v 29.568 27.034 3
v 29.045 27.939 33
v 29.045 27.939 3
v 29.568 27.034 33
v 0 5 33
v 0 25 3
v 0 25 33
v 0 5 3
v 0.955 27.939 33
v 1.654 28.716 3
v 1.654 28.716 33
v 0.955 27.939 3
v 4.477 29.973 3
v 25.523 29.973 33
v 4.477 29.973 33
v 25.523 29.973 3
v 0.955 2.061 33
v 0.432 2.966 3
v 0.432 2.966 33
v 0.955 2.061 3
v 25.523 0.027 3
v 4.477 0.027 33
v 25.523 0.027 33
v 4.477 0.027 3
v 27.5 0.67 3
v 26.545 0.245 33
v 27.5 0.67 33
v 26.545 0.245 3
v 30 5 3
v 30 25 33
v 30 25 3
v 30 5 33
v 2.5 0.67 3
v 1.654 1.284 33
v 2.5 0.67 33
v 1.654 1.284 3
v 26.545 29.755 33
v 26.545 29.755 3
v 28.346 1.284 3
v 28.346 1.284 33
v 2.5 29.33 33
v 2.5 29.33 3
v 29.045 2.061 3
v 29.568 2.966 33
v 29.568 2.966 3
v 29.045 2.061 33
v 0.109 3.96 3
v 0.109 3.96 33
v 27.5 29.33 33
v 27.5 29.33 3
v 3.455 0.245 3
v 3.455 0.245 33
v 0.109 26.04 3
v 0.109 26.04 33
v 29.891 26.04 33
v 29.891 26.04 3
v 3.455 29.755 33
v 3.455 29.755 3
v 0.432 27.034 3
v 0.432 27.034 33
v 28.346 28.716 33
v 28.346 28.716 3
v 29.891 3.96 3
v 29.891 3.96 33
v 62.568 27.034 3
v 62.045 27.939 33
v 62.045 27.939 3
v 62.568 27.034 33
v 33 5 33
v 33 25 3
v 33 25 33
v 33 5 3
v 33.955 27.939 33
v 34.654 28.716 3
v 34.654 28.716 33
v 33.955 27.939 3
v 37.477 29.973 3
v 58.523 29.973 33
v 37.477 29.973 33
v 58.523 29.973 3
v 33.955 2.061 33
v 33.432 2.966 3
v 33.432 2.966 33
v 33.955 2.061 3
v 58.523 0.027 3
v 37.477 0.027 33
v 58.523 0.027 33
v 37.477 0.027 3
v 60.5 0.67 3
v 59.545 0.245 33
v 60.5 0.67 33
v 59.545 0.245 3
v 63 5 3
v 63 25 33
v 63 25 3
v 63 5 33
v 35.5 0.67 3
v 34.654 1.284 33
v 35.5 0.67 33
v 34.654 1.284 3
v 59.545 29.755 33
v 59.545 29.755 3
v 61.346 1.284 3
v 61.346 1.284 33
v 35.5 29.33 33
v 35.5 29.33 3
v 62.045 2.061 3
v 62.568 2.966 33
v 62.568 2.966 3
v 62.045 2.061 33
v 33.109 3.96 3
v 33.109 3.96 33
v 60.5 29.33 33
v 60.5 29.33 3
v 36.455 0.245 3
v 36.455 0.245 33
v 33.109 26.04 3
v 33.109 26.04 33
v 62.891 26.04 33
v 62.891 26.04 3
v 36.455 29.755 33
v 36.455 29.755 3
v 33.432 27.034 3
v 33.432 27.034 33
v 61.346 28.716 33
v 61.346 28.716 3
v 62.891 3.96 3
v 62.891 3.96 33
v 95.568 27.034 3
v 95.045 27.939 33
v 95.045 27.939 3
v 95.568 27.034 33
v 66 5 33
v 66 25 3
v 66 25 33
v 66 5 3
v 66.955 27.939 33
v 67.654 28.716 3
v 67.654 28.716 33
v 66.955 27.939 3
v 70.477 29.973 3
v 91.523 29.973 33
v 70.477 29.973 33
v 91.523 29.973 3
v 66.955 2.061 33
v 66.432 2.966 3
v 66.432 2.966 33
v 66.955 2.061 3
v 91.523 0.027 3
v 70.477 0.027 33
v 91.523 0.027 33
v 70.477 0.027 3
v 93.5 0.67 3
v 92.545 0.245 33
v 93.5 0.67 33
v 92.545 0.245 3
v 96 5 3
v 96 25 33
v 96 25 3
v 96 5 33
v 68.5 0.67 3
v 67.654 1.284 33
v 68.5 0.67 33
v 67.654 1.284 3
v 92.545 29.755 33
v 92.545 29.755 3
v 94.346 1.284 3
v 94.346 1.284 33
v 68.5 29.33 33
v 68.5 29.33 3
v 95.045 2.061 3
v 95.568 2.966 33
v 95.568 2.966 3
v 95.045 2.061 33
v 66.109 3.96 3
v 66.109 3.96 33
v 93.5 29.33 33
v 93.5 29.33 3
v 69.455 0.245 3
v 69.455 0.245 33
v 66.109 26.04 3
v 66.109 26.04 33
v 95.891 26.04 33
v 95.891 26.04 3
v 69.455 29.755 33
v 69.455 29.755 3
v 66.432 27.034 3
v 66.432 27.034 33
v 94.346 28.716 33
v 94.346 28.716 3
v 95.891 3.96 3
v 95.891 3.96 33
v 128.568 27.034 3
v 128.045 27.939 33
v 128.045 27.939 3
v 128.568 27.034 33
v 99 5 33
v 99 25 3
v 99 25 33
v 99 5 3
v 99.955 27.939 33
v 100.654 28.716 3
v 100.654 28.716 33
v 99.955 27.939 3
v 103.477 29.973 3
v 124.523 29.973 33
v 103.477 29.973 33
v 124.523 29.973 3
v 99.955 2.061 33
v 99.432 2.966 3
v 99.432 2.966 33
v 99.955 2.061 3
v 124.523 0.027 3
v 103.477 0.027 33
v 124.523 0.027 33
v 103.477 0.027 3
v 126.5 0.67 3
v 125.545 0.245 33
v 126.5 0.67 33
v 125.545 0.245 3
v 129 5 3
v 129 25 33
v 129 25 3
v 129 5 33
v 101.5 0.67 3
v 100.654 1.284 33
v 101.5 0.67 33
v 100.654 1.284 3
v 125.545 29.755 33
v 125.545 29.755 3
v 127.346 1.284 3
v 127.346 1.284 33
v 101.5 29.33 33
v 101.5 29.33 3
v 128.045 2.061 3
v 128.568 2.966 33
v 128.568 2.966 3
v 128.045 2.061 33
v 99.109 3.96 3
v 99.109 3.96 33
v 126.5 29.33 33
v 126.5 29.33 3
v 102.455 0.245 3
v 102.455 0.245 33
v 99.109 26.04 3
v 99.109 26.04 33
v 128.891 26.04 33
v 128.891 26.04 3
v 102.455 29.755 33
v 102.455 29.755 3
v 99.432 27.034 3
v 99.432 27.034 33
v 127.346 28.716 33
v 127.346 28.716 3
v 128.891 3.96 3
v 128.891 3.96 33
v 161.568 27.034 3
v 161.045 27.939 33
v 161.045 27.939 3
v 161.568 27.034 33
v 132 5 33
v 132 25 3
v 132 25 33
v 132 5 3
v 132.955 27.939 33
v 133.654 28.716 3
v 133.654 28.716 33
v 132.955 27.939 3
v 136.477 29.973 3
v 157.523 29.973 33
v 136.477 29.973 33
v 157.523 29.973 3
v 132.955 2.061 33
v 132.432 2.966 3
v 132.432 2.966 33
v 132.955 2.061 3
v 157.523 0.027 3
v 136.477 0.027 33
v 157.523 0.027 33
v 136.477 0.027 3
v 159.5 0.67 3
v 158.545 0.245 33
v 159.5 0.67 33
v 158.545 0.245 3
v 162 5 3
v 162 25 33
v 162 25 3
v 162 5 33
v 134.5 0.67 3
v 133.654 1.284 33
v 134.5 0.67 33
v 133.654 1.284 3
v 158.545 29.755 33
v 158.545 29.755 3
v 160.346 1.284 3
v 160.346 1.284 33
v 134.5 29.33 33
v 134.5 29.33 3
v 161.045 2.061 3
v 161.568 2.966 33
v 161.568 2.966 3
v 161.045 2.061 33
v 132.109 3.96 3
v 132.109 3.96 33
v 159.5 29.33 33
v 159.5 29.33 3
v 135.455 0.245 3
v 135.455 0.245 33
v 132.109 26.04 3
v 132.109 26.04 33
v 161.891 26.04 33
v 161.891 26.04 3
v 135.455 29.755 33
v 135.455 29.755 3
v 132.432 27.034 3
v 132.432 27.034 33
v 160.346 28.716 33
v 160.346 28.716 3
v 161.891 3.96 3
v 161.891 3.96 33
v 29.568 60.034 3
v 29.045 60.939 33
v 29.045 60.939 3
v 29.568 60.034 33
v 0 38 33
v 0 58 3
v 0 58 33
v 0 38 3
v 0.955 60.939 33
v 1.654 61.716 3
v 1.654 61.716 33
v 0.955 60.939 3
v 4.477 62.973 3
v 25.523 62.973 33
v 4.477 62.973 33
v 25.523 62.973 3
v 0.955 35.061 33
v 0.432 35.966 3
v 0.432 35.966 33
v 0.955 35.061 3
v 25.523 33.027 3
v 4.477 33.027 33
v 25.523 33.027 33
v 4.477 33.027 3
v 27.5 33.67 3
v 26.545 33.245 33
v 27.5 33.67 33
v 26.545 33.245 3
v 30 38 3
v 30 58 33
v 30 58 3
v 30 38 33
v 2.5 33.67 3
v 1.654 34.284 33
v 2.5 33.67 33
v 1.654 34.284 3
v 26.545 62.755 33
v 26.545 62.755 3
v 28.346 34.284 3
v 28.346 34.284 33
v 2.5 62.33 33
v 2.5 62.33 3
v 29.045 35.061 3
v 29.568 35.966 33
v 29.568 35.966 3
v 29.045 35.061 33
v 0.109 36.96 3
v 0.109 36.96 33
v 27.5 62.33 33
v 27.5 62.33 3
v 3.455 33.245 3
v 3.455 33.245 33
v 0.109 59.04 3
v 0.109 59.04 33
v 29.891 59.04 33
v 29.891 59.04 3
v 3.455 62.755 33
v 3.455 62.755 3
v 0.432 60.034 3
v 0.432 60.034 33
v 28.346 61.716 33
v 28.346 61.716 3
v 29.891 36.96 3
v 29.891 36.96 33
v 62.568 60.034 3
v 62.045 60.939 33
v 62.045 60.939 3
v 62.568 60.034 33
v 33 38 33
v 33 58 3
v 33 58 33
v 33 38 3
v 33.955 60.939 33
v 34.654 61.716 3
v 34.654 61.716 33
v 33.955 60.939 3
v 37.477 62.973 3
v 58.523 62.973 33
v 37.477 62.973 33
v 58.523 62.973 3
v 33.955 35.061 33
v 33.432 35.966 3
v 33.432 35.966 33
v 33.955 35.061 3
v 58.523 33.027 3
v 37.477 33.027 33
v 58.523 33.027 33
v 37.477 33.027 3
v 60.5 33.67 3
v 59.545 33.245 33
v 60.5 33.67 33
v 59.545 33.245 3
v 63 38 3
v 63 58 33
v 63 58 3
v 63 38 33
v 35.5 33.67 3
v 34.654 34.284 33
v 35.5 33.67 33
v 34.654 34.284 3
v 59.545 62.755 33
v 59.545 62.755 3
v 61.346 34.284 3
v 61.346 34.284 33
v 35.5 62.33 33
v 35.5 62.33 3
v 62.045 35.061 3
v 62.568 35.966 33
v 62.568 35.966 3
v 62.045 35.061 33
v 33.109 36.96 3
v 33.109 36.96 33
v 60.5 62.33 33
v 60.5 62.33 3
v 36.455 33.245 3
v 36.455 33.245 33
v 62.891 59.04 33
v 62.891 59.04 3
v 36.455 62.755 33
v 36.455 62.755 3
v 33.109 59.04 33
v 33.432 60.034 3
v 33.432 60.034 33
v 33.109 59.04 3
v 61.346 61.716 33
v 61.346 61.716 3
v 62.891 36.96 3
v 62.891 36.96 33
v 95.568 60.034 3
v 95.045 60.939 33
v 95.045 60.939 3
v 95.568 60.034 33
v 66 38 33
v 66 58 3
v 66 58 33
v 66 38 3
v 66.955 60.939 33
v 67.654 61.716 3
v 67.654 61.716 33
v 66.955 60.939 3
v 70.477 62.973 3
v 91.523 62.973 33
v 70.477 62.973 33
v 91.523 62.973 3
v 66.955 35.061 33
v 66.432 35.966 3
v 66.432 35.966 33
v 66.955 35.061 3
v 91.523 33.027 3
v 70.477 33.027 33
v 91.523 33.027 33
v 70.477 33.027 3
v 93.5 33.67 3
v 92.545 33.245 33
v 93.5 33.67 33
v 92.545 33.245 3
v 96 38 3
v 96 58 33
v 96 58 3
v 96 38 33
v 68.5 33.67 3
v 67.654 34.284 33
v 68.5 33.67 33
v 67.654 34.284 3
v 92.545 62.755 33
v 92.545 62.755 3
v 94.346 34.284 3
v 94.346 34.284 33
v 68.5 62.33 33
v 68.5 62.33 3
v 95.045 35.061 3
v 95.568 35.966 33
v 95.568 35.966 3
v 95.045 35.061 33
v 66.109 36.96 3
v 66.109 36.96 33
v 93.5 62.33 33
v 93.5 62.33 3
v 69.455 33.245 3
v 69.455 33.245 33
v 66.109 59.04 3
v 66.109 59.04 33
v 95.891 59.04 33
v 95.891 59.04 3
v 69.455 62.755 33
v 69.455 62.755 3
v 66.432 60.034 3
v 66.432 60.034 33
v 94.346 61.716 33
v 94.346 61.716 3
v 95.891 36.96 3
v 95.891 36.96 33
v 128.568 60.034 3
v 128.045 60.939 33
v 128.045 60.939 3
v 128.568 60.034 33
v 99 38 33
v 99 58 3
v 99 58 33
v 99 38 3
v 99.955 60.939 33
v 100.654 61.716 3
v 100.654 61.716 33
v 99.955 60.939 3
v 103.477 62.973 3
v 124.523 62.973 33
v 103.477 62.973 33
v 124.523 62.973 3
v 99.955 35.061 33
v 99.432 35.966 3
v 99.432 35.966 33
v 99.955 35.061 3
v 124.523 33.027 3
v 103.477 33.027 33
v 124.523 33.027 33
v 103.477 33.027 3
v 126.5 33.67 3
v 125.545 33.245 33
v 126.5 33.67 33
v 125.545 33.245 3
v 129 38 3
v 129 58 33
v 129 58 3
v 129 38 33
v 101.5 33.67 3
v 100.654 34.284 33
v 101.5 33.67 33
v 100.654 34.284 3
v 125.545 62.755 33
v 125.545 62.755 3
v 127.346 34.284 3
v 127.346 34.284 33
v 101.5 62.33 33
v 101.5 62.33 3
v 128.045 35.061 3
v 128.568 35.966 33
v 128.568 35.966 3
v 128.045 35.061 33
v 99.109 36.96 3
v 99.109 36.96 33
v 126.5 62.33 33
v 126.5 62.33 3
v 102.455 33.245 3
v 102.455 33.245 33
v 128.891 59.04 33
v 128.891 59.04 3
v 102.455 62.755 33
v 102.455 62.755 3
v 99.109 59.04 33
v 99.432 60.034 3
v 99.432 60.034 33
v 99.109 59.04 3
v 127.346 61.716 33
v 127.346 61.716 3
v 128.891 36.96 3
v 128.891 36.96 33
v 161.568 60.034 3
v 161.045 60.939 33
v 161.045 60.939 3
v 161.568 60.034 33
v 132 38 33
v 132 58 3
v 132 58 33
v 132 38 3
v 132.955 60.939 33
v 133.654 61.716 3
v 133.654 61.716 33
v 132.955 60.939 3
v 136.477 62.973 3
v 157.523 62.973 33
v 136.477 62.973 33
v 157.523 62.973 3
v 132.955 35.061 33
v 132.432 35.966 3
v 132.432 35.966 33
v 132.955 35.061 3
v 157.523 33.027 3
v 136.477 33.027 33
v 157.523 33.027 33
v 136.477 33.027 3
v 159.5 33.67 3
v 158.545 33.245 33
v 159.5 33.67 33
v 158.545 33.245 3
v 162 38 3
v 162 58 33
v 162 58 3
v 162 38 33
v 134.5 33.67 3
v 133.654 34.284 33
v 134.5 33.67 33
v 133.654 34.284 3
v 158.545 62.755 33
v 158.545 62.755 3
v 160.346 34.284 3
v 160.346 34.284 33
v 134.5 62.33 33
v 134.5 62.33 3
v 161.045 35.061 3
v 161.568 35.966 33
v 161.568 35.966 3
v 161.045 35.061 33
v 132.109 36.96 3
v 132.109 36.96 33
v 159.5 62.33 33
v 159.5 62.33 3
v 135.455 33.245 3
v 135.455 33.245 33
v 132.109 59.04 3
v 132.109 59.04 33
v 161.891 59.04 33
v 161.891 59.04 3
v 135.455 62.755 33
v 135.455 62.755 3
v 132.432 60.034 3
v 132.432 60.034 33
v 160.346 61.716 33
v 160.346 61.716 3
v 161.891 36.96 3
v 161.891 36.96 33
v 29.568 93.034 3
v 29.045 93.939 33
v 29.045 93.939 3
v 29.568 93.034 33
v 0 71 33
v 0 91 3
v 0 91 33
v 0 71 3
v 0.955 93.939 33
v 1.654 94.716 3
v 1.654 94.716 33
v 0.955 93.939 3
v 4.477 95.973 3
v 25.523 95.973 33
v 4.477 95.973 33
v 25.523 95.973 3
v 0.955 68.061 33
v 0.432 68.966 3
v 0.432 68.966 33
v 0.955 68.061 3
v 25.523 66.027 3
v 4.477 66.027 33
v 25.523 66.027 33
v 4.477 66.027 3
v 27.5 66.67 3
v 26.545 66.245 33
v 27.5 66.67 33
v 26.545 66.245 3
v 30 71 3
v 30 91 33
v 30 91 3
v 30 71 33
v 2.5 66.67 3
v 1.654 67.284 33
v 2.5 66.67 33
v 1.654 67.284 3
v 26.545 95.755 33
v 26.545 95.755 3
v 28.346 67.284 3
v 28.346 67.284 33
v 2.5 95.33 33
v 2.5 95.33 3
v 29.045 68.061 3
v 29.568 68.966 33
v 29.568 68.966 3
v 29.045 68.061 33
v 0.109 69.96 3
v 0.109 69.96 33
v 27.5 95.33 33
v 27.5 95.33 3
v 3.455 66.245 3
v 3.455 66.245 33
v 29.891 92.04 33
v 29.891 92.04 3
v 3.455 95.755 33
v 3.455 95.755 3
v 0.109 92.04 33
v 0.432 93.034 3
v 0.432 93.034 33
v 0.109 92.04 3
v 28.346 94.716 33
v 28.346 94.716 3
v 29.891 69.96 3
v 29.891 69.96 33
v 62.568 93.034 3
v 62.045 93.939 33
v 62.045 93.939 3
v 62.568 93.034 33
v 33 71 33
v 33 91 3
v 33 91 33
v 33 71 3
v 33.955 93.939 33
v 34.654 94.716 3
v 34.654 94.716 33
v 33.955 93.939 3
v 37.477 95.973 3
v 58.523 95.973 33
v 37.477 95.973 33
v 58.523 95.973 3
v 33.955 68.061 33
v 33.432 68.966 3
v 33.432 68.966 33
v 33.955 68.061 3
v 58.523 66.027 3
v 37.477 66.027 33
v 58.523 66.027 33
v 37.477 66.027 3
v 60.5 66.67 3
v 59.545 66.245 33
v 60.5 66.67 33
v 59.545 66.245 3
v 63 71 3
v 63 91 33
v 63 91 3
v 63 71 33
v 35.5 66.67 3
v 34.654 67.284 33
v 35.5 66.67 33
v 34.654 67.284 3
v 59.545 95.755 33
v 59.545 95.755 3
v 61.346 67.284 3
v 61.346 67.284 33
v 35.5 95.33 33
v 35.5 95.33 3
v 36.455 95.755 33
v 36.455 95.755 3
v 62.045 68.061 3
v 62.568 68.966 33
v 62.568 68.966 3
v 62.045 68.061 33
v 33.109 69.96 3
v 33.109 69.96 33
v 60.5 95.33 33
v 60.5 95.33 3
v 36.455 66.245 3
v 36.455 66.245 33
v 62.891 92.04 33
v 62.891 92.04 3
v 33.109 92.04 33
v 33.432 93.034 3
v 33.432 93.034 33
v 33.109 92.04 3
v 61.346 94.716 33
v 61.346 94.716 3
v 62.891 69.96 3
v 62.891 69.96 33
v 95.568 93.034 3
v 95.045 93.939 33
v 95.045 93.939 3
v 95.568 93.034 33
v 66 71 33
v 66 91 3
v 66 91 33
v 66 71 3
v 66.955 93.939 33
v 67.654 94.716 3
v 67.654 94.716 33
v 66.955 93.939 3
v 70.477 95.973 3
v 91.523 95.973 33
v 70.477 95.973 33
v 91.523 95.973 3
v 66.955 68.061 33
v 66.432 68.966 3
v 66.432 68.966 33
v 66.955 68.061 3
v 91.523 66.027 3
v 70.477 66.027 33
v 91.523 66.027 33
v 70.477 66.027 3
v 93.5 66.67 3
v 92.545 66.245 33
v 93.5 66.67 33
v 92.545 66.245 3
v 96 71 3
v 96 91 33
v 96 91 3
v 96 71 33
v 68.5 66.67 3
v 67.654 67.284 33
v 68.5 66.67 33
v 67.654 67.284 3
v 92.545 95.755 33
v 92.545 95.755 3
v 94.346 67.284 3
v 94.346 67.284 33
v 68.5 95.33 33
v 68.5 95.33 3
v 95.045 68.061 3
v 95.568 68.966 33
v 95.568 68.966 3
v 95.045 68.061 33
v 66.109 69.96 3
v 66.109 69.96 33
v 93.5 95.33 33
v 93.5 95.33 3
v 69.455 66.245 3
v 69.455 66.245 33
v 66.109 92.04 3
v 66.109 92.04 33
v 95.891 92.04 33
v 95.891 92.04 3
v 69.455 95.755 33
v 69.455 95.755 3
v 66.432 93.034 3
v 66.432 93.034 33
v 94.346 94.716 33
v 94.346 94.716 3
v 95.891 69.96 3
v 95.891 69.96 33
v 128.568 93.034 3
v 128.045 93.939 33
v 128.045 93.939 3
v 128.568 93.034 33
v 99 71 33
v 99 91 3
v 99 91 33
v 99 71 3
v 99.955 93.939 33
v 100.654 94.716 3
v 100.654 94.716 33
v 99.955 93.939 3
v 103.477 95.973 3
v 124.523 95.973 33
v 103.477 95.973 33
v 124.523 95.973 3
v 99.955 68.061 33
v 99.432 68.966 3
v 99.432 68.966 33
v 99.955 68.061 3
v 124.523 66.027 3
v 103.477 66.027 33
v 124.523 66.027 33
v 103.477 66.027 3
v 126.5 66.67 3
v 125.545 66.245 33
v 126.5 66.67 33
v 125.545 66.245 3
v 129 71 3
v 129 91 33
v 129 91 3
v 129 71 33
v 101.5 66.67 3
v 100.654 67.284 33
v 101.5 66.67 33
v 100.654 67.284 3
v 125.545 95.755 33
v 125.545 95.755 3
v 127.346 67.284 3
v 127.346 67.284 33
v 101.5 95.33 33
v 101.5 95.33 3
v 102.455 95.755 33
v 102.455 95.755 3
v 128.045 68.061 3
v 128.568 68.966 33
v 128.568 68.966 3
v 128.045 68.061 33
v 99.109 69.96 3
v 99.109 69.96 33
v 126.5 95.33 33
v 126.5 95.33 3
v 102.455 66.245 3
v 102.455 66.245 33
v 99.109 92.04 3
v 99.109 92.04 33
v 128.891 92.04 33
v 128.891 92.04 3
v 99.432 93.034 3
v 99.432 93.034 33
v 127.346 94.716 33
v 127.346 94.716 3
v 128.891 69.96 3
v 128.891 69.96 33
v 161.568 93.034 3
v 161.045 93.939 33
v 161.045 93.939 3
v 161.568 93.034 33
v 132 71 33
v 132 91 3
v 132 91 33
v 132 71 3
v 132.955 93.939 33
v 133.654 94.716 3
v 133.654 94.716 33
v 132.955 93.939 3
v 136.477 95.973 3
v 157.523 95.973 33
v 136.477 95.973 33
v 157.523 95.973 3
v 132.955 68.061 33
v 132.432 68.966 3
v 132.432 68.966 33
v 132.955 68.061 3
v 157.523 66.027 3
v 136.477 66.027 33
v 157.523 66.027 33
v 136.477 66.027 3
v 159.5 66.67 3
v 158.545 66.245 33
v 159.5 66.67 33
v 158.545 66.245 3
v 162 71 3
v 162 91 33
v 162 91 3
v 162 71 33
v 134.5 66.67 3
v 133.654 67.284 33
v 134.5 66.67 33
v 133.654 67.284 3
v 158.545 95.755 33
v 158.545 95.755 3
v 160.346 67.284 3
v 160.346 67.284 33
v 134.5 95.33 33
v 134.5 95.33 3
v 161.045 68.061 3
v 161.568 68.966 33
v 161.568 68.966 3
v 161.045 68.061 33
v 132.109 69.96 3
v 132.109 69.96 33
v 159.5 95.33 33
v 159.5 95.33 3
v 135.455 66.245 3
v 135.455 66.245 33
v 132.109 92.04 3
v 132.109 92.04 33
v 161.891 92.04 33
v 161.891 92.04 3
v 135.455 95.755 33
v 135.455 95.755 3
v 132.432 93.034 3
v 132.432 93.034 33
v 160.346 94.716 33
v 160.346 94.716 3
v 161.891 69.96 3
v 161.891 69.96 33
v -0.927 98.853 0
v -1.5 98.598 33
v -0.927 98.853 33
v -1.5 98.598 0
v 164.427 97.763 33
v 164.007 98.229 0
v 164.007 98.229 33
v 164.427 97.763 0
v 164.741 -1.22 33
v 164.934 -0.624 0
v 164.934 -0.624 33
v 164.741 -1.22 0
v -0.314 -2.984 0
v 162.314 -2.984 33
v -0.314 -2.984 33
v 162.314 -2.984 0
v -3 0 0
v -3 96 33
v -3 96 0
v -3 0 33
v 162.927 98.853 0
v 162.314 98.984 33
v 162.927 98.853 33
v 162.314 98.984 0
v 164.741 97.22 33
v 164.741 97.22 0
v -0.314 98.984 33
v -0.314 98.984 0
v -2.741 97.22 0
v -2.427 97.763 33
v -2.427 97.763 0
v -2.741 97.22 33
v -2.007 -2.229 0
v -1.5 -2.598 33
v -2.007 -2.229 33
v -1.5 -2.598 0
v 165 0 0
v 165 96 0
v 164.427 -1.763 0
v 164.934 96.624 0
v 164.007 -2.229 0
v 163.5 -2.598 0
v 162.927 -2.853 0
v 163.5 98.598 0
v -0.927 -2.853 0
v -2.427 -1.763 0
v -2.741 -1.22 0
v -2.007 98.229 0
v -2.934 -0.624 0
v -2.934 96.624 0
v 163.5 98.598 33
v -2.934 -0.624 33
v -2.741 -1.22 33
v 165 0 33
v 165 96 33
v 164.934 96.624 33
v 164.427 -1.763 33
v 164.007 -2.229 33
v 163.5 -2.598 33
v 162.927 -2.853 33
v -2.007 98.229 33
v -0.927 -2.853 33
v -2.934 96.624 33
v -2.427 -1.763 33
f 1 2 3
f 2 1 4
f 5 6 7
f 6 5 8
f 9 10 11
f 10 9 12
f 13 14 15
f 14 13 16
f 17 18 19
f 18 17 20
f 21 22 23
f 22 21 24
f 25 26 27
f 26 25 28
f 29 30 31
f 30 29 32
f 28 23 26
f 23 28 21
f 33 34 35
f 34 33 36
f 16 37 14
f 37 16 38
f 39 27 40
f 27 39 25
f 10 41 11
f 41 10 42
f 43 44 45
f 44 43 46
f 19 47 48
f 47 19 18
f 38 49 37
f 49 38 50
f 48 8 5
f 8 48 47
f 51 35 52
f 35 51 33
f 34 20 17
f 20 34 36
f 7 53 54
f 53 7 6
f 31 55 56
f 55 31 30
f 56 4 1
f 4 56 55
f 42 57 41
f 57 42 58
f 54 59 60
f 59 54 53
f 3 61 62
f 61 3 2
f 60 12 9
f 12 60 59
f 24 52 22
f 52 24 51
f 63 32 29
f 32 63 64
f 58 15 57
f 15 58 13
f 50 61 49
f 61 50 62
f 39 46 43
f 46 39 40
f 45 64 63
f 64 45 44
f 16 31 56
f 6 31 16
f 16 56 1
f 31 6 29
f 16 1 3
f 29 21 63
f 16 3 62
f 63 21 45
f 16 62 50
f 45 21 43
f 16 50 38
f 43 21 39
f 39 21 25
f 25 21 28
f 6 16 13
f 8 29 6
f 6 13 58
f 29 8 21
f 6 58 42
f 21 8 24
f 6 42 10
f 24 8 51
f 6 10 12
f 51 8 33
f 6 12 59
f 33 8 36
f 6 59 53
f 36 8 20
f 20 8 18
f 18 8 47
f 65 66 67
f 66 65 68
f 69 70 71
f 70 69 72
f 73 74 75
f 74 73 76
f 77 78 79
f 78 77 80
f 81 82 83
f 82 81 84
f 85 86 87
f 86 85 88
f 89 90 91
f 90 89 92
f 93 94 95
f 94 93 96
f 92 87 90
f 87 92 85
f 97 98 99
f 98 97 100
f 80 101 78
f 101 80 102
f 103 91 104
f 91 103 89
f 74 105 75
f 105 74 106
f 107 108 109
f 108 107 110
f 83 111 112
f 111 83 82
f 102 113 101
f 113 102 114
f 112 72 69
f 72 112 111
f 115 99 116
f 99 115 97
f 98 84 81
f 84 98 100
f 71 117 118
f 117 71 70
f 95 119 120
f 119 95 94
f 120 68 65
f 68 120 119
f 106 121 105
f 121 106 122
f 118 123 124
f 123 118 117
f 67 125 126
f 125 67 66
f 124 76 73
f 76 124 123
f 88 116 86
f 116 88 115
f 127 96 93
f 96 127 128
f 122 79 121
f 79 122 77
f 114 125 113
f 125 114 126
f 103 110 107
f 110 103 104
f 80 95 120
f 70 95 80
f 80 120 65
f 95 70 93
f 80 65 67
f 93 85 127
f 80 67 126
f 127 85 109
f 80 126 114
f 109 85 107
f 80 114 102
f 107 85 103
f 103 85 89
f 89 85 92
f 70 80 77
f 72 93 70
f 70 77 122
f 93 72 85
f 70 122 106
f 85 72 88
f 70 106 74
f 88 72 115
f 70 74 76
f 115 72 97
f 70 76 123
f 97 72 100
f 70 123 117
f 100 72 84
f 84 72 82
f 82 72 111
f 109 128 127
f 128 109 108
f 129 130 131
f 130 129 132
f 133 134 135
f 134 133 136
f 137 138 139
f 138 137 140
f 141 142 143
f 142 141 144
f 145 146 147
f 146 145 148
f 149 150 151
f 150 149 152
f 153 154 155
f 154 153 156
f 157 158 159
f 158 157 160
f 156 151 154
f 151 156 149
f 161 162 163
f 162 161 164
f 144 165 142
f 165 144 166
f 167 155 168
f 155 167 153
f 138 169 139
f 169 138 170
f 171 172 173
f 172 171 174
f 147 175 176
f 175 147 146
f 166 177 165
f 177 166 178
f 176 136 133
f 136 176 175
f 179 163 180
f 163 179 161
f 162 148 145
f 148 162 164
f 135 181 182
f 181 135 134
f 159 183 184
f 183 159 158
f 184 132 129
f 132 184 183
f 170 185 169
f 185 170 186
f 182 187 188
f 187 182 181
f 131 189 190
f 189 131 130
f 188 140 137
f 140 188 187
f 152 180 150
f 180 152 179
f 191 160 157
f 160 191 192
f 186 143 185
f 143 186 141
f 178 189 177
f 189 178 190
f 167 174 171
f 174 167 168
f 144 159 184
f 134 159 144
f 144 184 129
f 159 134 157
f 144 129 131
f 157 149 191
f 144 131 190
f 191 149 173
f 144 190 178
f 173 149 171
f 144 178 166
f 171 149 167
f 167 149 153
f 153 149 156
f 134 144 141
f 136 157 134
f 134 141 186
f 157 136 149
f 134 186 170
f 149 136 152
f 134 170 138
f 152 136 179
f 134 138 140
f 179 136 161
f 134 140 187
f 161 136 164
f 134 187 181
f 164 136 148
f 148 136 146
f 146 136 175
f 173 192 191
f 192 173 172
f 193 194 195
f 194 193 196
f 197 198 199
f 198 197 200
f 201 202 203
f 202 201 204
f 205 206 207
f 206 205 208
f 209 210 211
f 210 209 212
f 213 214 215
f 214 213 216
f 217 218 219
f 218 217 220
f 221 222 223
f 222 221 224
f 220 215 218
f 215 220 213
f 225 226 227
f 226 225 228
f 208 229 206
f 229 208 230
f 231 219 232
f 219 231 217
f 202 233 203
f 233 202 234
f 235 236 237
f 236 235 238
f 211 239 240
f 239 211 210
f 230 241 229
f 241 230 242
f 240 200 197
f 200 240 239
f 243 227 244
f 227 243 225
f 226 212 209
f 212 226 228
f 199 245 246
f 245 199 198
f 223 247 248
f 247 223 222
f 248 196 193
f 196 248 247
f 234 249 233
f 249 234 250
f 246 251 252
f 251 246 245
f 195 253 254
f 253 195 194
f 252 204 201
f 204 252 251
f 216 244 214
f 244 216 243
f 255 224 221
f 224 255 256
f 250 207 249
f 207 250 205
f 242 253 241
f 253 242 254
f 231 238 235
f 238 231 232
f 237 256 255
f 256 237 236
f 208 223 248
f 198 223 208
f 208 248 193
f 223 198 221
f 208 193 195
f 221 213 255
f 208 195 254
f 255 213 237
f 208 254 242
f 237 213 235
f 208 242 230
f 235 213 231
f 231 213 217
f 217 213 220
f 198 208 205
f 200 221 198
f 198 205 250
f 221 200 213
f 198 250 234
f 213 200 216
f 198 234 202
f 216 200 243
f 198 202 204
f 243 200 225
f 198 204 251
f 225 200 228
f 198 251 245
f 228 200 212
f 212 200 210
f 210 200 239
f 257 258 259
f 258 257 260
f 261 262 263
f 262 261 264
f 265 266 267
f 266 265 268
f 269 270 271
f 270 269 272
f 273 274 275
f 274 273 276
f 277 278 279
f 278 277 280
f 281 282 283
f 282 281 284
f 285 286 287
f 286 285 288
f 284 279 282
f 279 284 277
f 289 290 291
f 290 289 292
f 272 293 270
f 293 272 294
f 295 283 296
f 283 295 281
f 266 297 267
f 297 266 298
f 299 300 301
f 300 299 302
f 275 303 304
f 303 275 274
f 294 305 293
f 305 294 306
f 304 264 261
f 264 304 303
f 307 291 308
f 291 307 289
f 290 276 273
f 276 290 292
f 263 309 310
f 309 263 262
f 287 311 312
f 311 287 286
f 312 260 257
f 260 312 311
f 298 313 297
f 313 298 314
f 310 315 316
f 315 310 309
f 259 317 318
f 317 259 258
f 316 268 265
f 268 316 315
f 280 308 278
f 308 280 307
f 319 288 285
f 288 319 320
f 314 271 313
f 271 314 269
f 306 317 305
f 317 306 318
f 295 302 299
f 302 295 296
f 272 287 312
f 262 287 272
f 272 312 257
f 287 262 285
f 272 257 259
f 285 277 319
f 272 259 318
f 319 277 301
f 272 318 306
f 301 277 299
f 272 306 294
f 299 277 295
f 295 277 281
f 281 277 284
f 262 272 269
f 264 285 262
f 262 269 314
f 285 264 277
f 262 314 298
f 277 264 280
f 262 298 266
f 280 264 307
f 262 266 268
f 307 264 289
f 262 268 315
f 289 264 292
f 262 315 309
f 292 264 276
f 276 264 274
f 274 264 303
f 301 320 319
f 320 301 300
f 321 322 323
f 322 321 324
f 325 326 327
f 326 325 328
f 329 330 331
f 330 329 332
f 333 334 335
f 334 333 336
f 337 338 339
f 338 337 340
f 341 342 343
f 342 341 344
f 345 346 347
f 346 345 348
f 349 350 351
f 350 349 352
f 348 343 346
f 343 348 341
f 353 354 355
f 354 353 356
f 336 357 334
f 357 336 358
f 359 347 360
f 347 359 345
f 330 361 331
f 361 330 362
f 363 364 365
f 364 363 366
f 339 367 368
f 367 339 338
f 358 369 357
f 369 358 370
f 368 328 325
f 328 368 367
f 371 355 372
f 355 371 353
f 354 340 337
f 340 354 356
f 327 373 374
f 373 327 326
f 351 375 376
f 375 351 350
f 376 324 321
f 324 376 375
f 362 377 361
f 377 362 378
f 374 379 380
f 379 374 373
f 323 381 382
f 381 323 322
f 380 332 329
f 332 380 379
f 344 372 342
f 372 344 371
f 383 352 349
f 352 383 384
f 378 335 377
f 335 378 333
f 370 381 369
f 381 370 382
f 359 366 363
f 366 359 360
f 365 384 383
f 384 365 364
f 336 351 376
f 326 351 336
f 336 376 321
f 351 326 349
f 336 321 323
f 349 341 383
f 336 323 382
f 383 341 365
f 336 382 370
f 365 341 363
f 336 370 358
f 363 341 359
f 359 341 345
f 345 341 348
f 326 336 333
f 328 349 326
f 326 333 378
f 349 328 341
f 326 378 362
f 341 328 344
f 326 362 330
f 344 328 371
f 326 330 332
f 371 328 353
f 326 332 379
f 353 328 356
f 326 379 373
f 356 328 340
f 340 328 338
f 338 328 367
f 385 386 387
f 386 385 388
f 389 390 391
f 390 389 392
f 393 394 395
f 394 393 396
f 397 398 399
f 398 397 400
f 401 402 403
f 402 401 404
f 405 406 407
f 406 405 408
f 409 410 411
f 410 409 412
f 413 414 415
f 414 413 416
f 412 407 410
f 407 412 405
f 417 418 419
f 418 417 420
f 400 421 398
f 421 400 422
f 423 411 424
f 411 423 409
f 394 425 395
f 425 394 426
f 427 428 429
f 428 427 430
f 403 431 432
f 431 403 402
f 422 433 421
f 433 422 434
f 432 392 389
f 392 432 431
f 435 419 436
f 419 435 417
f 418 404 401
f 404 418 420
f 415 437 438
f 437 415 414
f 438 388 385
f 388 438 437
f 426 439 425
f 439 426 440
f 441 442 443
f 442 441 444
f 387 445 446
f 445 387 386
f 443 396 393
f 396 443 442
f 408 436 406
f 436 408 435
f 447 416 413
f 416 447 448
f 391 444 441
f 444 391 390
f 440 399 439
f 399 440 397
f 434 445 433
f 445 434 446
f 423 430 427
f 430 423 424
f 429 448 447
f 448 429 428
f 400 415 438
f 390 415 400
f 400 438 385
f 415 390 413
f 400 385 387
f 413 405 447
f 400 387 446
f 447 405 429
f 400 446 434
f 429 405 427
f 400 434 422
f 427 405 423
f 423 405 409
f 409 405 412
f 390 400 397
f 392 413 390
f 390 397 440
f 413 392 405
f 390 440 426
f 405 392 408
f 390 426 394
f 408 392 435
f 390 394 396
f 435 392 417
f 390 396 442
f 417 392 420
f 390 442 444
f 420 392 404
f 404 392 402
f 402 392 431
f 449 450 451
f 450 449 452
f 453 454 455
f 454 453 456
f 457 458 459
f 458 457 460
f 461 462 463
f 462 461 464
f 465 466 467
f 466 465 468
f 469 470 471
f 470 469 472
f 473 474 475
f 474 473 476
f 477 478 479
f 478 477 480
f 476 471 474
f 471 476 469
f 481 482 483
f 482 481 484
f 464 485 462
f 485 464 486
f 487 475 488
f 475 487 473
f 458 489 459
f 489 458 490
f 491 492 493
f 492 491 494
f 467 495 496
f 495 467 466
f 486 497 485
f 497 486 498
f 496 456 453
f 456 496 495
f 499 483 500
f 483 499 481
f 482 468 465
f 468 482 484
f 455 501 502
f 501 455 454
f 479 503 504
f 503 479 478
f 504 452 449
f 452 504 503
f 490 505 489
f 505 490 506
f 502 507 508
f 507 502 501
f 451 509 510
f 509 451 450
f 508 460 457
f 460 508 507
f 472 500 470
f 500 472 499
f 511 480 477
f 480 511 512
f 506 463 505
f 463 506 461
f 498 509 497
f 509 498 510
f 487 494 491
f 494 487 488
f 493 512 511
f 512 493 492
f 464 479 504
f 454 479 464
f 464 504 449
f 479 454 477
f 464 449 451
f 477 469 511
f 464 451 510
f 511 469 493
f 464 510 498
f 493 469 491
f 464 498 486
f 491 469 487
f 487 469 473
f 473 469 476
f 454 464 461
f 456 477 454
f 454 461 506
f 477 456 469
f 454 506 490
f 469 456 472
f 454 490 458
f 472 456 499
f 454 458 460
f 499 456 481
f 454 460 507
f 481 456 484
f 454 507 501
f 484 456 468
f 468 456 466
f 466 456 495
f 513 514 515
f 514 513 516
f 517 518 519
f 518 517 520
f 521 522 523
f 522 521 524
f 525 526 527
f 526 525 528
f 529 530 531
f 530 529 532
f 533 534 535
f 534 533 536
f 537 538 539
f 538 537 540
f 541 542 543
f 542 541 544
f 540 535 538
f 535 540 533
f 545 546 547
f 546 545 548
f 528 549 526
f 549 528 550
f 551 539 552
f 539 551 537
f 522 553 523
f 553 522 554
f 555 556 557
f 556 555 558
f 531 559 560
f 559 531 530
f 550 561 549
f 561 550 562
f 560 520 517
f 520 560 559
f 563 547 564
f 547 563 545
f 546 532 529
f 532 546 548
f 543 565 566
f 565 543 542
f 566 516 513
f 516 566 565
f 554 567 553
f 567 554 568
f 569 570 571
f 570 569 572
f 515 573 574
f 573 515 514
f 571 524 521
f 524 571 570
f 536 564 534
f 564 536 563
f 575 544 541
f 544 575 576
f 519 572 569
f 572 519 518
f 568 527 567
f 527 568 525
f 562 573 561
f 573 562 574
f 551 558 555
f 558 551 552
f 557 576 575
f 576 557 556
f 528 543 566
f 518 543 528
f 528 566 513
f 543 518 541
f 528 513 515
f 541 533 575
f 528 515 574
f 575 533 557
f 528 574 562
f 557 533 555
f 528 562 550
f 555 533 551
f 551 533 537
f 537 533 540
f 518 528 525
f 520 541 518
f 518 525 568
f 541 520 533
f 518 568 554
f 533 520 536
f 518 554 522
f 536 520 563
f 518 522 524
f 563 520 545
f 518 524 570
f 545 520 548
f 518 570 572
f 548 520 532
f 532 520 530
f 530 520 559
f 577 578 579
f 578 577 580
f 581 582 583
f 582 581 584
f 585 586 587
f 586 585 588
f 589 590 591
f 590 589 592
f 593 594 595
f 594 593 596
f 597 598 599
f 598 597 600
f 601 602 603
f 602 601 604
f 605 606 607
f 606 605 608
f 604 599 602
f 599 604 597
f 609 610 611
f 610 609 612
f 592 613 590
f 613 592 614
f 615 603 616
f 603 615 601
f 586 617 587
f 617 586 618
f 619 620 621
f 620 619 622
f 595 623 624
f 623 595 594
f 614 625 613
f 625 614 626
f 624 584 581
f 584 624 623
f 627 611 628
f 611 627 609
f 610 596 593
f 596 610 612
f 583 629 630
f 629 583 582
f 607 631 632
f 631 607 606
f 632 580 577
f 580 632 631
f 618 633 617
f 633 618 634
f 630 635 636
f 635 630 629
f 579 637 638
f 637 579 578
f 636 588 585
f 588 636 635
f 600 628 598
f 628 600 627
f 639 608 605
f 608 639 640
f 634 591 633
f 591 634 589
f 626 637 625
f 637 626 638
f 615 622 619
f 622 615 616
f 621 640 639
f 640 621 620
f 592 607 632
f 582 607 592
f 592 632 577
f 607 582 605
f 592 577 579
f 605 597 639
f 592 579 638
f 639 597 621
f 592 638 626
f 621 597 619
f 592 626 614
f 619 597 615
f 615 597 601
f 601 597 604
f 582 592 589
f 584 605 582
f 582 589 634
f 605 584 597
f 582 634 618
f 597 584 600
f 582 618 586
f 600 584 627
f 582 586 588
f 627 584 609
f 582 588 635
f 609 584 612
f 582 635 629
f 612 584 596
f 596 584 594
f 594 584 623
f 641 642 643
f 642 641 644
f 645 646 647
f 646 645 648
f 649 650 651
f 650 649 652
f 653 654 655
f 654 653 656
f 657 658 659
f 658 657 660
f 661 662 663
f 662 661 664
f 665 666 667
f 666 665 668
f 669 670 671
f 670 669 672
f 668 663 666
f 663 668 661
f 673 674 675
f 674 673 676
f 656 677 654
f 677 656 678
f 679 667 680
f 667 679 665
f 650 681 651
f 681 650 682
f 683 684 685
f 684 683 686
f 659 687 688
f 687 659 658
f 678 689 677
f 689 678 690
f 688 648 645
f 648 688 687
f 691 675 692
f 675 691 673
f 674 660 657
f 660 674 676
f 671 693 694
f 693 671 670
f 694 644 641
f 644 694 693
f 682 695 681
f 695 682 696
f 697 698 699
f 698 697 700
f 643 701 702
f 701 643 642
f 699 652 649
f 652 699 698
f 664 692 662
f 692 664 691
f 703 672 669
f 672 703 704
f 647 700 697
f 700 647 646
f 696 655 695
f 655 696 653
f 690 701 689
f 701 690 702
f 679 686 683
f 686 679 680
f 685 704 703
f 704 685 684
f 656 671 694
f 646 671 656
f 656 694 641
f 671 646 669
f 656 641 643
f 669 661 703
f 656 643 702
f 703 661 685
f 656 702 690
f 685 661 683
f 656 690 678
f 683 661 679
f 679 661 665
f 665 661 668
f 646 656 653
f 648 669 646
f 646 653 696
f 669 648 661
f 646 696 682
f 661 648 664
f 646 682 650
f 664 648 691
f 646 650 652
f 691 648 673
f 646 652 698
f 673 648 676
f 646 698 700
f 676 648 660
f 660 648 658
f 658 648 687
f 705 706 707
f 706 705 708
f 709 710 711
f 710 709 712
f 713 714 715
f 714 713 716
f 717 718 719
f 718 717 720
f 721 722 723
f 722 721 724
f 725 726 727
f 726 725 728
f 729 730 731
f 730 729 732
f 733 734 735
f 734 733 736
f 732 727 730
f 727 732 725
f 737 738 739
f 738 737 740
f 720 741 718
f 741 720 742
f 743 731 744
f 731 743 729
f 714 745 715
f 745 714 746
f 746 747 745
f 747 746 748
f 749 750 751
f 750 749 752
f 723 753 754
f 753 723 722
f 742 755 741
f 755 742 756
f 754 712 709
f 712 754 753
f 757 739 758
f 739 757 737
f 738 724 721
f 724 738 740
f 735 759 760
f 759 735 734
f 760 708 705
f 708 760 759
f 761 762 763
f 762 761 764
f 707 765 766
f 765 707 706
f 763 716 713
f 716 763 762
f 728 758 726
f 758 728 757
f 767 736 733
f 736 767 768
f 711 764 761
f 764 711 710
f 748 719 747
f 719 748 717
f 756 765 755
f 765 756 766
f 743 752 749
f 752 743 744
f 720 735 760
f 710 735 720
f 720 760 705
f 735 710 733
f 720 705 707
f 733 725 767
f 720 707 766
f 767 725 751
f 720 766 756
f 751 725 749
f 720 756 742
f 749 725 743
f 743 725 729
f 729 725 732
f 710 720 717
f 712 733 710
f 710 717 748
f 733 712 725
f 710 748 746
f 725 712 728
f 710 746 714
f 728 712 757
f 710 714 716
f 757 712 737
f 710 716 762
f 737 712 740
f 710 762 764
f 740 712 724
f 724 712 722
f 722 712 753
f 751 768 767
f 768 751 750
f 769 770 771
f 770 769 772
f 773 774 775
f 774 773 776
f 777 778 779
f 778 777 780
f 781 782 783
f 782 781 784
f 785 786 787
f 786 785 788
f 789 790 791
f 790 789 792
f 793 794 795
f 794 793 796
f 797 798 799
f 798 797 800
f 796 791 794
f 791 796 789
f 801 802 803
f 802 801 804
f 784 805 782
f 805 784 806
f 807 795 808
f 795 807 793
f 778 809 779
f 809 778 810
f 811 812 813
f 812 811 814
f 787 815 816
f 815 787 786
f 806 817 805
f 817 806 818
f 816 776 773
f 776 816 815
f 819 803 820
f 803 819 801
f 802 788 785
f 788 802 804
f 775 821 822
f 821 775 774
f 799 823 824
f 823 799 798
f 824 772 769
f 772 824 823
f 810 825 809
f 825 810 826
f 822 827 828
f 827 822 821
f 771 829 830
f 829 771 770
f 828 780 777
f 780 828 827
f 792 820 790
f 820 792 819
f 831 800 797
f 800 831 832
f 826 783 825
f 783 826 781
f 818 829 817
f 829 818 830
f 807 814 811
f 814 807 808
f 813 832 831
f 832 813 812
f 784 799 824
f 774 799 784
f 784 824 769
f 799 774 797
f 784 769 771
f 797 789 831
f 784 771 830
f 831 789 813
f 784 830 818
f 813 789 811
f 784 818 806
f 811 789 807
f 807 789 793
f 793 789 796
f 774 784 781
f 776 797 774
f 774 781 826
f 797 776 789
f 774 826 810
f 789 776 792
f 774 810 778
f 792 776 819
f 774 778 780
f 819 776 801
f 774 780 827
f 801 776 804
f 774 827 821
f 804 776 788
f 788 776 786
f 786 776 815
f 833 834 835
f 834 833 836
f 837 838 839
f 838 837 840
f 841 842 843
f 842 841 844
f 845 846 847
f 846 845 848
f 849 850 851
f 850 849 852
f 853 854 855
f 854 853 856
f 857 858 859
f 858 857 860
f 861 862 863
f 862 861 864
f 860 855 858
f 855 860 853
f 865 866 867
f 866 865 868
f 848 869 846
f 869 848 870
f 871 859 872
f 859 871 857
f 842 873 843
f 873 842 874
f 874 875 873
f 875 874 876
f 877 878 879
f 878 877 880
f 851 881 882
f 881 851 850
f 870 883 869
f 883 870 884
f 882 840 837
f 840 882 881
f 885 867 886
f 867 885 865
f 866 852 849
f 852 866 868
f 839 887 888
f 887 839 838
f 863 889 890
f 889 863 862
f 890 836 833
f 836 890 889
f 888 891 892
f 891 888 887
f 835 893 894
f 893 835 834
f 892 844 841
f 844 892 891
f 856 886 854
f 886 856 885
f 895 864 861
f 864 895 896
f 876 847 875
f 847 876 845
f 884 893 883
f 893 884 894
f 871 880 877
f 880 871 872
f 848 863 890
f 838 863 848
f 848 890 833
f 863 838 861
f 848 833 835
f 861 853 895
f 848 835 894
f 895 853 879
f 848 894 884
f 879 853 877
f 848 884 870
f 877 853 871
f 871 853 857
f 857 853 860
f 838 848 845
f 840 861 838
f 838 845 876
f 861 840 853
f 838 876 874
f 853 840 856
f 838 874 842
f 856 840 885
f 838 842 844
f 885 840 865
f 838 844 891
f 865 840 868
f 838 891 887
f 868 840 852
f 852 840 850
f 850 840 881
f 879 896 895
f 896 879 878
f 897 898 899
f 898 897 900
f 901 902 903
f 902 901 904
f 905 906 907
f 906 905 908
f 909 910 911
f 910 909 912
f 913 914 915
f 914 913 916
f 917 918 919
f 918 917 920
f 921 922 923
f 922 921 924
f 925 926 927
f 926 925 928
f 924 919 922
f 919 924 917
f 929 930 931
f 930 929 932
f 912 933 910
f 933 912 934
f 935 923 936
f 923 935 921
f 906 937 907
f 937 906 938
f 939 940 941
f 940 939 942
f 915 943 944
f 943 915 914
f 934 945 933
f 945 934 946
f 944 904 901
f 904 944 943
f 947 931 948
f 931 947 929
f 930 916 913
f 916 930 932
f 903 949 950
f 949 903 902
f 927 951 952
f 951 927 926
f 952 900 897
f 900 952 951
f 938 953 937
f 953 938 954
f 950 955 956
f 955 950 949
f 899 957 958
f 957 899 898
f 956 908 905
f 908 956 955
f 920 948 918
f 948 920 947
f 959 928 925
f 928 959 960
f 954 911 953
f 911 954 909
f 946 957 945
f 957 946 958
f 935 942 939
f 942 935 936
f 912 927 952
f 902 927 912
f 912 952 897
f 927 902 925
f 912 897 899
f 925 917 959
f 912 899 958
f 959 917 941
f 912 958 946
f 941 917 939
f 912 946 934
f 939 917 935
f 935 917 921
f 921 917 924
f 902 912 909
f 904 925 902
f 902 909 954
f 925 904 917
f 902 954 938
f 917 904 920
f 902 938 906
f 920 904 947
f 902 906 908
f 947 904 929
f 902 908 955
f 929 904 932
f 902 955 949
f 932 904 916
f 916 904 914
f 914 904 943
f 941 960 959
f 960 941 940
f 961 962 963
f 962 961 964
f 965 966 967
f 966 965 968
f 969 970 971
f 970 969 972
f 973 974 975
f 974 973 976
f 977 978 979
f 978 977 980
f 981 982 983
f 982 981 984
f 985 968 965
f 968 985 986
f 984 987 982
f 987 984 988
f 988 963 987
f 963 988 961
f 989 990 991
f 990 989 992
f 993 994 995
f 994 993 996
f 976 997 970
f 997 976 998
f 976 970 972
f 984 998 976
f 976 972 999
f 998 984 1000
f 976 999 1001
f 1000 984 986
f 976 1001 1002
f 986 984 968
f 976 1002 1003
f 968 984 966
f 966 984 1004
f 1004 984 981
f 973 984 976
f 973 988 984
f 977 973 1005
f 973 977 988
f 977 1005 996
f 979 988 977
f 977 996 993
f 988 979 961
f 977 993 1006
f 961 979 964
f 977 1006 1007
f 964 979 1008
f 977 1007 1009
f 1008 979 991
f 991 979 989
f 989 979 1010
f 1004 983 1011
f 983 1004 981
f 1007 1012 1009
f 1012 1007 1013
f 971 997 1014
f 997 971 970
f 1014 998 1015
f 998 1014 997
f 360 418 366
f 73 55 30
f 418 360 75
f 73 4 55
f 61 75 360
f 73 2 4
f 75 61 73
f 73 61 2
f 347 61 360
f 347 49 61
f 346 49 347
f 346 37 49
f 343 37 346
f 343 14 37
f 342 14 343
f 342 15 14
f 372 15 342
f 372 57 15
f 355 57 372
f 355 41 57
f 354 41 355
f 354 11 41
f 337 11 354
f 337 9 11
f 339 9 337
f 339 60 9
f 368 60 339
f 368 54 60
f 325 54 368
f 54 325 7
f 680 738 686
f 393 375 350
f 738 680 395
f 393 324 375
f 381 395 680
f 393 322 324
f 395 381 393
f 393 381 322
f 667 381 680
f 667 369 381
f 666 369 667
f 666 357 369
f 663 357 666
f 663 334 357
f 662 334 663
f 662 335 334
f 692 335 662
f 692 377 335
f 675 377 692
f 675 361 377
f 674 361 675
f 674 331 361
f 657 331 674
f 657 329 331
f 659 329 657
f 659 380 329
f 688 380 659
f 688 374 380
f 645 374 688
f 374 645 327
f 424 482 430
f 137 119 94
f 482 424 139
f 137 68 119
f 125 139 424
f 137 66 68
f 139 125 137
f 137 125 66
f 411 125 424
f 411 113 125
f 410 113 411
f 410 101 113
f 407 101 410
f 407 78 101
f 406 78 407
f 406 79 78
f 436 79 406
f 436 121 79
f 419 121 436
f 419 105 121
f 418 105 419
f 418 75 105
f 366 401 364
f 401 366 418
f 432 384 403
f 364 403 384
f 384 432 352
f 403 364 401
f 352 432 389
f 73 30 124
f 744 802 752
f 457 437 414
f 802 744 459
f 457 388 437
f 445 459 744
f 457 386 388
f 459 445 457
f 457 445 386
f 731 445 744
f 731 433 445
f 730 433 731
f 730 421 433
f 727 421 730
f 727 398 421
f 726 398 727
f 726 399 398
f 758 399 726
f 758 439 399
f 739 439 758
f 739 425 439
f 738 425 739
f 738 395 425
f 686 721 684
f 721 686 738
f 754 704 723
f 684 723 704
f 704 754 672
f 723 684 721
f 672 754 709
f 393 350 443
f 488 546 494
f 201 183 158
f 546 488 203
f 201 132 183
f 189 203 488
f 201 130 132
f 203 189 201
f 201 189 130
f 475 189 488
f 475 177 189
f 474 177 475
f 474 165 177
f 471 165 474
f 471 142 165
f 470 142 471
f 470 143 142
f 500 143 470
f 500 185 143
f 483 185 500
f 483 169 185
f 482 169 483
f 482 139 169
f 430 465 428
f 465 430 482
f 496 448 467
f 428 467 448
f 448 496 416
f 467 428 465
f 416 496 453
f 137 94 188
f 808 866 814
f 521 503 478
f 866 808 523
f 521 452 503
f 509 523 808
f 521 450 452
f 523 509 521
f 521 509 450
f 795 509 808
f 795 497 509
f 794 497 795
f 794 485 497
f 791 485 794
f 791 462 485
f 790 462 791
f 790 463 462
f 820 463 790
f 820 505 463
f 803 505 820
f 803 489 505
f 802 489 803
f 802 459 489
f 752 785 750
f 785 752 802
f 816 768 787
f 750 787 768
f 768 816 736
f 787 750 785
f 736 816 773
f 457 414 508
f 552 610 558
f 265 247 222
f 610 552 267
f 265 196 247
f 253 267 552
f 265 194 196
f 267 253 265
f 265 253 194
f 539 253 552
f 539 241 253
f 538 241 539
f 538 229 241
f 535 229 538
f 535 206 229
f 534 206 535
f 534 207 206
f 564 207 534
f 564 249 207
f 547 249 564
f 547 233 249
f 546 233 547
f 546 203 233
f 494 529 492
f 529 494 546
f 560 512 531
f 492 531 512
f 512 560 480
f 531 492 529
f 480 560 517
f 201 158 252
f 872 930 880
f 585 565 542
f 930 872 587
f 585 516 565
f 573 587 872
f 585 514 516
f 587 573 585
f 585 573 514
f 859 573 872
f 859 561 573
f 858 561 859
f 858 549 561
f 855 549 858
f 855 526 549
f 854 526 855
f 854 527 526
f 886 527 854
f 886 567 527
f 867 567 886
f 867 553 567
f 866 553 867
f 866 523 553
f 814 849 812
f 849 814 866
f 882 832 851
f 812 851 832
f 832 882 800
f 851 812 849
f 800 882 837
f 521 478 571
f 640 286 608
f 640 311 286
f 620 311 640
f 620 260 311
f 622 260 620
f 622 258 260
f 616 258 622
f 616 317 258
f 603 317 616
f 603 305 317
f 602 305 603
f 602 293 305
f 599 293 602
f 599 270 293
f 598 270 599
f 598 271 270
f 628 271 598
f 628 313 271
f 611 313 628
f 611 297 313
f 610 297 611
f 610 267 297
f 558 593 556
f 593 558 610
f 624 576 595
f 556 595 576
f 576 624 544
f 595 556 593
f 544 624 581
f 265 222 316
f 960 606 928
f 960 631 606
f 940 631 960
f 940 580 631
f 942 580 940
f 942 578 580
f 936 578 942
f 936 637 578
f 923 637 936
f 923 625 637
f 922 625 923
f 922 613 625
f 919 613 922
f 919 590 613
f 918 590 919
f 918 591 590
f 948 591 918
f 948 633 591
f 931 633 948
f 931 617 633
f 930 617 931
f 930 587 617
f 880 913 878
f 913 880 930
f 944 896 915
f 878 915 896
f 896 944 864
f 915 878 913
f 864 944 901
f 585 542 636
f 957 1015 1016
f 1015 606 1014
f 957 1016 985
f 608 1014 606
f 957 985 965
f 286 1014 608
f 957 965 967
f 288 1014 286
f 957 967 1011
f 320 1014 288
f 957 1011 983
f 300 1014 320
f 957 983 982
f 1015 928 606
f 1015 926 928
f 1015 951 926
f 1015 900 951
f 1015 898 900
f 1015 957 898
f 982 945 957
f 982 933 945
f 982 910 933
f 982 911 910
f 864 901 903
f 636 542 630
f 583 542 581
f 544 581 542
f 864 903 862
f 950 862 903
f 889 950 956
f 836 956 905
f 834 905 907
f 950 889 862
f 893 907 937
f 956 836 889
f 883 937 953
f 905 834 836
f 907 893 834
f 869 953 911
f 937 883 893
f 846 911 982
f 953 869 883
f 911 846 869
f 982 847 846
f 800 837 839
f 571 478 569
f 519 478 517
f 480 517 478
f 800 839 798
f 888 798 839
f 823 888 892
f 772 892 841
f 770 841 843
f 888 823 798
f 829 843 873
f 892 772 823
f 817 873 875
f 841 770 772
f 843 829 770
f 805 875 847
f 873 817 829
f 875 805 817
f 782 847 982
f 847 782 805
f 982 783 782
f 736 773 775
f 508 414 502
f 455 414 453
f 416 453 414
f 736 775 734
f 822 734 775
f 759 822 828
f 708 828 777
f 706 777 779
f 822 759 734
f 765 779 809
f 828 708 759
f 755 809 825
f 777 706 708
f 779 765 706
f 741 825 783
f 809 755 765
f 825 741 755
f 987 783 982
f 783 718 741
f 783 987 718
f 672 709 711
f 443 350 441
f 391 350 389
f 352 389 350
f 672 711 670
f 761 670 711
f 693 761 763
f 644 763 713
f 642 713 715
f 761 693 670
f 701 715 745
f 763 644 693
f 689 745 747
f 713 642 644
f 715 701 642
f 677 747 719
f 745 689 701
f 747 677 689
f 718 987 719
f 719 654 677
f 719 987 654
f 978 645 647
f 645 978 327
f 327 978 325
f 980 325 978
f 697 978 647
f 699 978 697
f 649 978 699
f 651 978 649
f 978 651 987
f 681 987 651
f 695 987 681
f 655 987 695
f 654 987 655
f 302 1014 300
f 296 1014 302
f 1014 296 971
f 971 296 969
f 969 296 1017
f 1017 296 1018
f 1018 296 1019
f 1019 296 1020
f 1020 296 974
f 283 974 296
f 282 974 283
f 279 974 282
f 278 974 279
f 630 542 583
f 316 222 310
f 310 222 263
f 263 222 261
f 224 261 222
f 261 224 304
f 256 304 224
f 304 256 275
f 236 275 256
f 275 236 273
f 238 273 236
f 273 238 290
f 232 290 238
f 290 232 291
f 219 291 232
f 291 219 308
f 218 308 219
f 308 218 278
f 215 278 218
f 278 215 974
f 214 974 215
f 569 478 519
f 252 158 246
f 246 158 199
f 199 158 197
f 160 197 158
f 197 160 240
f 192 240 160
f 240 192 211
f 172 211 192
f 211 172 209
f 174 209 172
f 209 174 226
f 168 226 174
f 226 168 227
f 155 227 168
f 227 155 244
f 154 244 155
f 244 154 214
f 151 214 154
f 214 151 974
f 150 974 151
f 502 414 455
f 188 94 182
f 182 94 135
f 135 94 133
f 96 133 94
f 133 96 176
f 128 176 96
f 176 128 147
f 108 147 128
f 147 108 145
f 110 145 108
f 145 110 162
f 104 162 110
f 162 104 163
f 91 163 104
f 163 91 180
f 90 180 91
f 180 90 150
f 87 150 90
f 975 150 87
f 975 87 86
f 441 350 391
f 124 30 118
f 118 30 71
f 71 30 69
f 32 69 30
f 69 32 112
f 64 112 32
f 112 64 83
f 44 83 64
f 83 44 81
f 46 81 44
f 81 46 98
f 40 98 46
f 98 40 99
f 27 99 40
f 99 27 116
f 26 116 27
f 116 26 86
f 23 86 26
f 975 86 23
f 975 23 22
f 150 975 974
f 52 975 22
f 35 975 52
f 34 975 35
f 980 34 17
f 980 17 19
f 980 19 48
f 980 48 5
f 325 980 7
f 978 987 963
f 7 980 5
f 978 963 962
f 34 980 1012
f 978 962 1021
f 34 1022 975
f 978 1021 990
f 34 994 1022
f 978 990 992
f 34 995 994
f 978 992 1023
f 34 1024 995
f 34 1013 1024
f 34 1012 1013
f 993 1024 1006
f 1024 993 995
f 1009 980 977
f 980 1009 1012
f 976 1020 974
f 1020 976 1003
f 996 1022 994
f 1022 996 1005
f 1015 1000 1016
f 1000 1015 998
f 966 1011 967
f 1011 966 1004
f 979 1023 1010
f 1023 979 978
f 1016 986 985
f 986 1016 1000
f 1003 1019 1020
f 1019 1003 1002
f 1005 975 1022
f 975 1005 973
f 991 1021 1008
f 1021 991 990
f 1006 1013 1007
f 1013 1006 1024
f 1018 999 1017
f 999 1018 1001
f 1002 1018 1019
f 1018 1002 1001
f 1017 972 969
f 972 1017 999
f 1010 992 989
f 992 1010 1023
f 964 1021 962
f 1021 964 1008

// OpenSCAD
// [FL_INDEX: keywords="openscad, 3d_parametric, Round_organizer, csg_solid" | COT="Parametric OpenSCAD design from 3DCodeverse"]
// Title: Round organizer

numberOfColumns = 5; 
numberOfRows = 3; 

singleBoxWidth = 30;
singleBoxHeight = 30;

baseHeight = 3; 
boxHeight = 30; 

internalWallThickness = 3;
externalWallThickness = 3;

internalRadius = 5;
quality=30; // [10:60]

// ignore
$fn=quality;


module roundbox(r,wi,he,dz) {
	hull()
	{
		cube([wi, he, dz]);
		translate([0,0,0])
			cylinder(r=r, h=dz);
		translate([wi, 0, 0])
			cylinder(r=r, h=dz);
		translate([wi, he, 0])
			cylinder(r=r, h=dz);
		translate([0, he, 0])
			cylinder(r=r, h=dz);
	}

}


module organizer() {
	difference() {
	   roundbox(externalWallThickness, numberOfColumns*singleBoxWidth+(numberOfColumns-1)*internalWallThickness, numberOfRows*singleBoxHeight+(numberOfRows-1)*internalWallThickness, baseHeight+boxHeight);
	   for (y=[0:numberOfRows-1])
			for (x=[0:numberOfColumns-1]) {
				translate([(internalWallThickness+singleBoxWidth)*x, (internalWallThickness+singleBoxHeight)*y, baseHeight]) {
				translate([internalRadius,internalRadius,0])
					roundbox(internalRadius,singleBoxWidth-2*internalRadius,singleBoxHeight-2*internalRadius, boxHeight+1);
			}
		}
	}
}


organizer();
